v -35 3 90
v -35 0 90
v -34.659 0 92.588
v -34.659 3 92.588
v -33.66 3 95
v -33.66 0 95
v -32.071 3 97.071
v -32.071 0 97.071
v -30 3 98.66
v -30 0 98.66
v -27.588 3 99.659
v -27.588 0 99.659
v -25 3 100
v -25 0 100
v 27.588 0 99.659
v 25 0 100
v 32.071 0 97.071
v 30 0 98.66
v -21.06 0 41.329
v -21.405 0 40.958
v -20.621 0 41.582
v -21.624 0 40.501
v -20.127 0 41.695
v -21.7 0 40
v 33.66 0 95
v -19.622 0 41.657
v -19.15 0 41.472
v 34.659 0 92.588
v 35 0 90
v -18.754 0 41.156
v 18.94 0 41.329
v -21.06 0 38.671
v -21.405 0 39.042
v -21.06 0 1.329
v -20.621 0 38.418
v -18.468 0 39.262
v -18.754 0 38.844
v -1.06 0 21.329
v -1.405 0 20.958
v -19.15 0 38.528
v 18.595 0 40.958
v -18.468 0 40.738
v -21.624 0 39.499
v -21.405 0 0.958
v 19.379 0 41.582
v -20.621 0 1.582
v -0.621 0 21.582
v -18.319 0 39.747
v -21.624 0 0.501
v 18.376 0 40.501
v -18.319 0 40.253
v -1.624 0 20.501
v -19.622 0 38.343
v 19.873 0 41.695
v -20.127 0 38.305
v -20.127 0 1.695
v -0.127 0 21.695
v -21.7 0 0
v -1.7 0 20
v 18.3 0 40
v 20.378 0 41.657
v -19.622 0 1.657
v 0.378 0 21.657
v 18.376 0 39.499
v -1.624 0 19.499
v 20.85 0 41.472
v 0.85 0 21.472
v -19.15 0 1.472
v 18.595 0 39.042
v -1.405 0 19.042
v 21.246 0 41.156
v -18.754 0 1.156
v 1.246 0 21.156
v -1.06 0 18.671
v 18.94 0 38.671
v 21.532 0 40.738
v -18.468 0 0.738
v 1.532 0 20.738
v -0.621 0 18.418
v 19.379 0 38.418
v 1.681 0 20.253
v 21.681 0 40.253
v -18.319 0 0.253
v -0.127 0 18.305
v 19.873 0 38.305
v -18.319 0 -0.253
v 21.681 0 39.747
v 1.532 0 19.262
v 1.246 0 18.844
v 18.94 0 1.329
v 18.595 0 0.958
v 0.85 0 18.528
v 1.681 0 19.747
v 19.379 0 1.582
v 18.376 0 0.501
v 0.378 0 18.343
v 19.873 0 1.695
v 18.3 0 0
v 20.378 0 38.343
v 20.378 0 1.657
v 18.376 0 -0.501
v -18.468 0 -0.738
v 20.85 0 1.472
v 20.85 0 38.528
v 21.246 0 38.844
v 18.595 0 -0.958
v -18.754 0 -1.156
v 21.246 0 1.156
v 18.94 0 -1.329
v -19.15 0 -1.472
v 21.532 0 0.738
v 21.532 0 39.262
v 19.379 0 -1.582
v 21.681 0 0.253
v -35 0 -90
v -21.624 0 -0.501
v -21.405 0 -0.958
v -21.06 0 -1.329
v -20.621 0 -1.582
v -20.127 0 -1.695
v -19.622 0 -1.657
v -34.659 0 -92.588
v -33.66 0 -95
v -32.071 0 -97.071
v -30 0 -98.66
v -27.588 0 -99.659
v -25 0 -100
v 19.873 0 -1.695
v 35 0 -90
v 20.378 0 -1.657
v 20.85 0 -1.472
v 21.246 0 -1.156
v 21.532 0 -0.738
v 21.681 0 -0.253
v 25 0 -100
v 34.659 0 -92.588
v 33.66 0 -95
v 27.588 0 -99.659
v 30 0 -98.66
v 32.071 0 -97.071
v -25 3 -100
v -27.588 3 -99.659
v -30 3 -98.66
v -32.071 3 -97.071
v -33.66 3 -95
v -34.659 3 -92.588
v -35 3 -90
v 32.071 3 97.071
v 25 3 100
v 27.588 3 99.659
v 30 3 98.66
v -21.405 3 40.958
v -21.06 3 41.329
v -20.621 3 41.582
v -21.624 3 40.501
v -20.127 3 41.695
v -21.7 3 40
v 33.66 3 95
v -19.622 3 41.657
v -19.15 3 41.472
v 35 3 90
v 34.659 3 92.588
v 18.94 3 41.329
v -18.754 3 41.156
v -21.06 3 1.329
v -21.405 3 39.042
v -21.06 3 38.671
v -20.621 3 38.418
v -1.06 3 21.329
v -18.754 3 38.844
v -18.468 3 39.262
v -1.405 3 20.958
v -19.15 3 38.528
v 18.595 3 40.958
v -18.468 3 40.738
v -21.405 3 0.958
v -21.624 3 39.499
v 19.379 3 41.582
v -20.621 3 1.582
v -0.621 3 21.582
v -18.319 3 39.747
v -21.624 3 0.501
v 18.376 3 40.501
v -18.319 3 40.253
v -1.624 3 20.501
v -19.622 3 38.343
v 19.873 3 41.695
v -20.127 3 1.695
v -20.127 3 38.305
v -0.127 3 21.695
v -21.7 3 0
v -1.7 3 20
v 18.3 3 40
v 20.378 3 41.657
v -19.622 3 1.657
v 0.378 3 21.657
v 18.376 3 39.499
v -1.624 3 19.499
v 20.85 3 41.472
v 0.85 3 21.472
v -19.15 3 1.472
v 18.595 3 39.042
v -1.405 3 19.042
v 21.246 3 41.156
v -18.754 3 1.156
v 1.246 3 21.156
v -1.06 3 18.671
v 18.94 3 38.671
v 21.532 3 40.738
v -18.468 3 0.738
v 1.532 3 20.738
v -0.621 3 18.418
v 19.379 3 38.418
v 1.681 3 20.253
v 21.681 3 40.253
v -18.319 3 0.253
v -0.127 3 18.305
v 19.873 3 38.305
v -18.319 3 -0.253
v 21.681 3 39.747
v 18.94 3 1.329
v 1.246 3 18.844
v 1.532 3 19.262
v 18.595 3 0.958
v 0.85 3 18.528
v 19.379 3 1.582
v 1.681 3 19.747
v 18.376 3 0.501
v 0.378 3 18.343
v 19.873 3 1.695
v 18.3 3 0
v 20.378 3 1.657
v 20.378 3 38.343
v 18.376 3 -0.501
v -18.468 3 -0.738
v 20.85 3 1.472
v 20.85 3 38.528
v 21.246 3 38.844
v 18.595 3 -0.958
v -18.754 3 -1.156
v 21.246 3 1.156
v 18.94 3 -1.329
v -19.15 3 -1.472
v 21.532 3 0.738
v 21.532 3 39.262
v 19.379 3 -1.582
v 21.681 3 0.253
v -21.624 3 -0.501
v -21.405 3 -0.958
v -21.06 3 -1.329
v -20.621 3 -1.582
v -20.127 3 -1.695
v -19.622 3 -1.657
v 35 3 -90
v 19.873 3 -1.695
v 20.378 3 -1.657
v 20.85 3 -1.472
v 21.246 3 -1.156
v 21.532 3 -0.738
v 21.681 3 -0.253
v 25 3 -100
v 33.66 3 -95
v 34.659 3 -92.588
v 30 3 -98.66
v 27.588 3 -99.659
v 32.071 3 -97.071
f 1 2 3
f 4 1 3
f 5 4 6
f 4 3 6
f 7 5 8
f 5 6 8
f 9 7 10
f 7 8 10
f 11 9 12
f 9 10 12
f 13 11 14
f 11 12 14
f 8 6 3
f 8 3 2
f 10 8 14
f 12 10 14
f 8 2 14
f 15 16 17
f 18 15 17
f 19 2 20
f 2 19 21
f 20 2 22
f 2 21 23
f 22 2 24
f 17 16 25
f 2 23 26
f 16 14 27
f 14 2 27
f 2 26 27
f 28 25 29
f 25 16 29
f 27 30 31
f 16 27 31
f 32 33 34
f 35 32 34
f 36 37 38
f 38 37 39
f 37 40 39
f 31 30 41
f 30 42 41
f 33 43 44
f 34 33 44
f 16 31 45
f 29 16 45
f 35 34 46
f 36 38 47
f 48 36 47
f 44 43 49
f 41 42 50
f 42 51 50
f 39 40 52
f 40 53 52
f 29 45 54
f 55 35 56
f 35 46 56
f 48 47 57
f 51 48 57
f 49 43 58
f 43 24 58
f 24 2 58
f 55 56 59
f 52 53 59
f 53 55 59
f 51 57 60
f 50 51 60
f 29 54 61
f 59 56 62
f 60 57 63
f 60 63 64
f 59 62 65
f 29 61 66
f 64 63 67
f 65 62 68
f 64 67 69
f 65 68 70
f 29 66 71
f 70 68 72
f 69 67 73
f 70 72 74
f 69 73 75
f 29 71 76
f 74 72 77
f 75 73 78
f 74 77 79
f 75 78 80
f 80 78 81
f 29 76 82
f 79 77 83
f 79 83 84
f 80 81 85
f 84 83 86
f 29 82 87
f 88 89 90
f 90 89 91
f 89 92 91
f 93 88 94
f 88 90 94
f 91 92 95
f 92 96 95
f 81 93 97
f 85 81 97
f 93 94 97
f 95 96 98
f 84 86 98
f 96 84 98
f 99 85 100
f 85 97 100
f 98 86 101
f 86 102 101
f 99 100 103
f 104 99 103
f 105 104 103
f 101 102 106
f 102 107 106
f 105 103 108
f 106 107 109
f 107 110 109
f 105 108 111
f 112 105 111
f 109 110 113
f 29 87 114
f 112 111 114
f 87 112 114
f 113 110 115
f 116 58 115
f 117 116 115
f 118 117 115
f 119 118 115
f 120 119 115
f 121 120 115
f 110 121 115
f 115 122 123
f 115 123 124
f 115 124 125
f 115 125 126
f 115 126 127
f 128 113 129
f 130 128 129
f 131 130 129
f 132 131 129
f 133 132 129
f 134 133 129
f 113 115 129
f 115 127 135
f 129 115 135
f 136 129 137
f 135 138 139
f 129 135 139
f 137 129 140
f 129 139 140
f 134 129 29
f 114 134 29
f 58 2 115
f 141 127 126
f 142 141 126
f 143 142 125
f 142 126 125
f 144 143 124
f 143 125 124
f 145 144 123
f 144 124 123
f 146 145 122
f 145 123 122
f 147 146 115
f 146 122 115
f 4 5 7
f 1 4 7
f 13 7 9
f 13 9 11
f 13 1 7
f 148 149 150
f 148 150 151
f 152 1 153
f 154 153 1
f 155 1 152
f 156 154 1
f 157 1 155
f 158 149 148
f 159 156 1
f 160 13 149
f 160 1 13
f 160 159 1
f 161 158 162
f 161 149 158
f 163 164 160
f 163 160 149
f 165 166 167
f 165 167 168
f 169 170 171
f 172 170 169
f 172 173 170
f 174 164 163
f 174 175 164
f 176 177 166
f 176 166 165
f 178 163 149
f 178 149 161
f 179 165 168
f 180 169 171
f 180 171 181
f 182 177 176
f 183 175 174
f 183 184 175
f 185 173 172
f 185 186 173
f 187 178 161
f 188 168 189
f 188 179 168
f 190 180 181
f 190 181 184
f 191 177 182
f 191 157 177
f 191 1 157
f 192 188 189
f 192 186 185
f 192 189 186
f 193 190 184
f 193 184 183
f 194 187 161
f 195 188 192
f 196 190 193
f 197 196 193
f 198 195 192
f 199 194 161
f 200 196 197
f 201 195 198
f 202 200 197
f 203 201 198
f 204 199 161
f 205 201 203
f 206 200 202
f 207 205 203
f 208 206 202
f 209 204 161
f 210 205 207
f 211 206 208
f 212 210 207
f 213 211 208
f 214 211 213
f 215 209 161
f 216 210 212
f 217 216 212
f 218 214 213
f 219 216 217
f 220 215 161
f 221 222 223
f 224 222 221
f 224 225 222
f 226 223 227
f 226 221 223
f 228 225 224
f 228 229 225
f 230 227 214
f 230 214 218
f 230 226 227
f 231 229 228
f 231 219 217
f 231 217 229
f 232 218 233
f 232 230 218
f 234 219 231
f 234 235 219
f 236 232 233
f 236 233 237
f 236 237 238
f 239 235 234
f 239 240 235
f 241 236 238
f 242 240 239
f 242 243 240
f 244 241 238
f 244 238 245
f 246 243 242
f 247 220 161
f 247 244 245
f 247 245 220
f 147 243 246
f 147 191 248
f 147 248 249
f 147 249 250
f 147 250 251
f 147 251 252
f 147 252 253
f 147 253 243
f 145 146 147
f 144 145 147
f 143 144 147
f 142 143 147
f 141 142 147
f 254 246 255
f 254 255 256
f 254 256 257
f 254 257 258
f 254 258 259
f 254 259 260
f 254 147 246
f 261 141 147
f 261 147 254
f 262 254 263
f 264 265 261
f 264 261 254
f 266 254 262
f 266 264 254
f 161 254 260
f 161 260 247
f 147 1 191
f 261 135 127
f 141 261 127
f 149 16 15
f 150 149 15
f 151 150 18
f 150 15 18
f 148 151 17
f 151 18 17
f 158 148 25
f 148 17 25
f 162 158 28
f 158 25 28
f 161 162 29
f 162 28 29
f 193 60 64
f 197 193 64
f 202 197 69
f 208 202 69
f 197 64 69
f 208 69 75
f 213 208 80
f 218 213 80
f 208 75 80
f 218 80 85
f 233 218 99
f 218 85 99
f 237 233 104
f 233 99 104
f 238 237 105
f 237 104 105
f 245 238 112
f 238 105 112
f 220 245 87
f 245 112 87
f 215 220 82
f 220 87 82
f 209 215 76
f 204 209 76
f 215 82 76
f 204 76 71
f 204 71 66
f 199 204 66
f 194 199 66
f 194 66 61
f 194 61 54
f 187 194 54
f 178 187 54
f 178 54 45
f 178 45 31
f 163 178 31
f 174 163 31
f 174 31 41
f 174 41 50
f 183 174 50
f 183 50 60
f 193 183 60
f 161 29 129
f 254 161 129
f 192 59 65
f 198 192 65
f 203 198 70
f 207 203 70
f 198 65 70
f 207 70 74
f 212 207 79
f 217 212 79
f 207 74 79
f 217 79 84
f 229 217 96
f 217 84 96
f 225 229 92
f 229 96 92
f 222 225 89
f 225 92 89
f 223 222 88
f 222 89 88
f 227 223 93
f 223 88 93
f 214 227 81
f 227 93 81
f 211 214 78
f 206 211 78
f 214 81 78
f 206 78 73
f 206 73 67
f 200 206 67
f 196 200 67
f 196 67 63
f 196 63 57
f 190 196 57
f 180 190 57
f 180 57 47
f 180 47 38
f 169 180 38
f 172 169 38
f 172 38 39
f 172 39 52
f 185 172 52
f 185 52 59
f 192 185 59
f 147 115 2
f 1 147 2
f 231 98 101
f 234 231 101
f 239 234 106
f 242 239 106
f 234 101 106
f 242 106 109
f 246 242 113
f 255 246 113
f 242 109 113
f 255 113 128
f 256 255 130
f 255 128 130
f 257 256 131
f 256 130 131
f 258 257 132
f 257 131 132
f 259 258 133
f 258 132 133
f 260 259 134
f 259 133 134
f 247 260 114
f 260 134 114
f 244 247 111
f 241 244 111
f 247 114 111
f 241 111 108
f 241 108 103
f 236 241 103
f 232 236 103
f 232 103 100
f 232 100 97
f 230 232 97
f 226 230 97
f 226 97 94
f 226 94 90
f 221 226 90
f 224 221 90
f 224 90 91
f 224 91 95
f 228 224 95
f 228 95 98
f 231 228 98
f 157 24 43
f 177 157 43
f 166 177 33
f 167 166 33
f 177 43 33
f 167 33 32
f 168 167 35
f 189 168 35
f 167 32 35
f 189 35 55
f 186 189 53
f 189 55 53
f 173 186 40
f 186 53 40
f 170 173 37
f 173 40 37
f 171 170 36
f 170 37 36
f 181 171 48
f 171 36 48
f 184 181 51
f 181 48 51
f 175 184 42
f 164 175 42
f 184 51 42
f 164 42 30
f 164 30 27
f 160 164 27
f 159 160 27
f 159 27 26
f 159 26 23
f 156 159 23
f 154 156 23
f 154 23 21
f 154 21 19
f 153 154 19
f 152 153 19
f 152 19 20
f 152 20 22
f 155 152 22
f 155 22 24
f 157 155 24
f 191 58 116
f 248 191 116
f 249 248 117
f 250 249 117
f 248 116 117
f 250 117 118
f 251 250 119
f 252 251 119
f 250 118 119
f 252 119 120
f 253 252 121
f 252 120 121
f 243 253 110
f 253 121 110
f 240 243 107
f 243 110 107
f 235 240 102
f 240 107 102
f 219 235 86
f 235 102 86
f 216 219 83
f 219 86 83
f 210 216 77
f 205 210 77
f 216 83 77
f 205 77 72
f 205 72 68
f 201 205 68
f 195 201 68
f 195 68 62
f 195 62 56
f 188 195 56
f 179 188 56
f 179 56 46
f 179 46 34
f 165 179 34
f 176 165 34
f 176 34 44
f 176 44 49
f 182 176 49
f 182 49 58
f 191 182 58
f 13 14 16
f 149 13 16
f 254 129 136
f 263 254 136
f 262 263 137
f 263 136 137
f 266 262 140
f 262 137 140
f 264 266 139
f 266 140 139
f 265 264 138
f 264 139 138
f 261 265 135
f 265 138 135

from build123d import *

# Parameters (mm, degrees)
SALIENTE_EXTRUIR1_DEPTH      = 3
TALADRO_DE_MARGEN_PARA_M31_D = 3.4


with BuildPart() as part:
    # Croquis1 → Saliente-Extruir1 (new body)
    with BuildSketch(Plane(origin=(0, 0, 0), x_dir=(1, 0, 0), z_dir=(0, 1, 0))):
        with BuildLine():
            Line((-25, -100), (25, -100))
            ThreePointArc((25, -100), (32.071067812, -97.071067812), (35, -90))
            Line((35, -90), (35, 90))
            ThreePointArc((35, 90), (32.071067812, 97.071067812), (25, 100))
            Line((25, 100), (-25, 100))
            ThreePointArc((-25, 100), (-32.071067812, 97.071067812), (-35, 90))
            Line((-35, 90), (-35, -90))
            ThreePointArc((-35, -90), (-32.071067812, -97.071067812), (-25, -100))
        make_face()
    extrude(amount=SALIENTE_EXTRUIR1_DEPTH)

    # Taladro de margen para M31 (through all)
    with Locations(Plane(origin=(0, 3, 0), x_dir=(1, 0, 0), z_dir=(0, 1, 0))):
        with Locations((-20, 0), (-20, -40), (20, -40), (20, 0), (0, -20)):
            Hole(TALADRO_DE_MARGEN_PARA_M31_D / 2)


solid = part.part
